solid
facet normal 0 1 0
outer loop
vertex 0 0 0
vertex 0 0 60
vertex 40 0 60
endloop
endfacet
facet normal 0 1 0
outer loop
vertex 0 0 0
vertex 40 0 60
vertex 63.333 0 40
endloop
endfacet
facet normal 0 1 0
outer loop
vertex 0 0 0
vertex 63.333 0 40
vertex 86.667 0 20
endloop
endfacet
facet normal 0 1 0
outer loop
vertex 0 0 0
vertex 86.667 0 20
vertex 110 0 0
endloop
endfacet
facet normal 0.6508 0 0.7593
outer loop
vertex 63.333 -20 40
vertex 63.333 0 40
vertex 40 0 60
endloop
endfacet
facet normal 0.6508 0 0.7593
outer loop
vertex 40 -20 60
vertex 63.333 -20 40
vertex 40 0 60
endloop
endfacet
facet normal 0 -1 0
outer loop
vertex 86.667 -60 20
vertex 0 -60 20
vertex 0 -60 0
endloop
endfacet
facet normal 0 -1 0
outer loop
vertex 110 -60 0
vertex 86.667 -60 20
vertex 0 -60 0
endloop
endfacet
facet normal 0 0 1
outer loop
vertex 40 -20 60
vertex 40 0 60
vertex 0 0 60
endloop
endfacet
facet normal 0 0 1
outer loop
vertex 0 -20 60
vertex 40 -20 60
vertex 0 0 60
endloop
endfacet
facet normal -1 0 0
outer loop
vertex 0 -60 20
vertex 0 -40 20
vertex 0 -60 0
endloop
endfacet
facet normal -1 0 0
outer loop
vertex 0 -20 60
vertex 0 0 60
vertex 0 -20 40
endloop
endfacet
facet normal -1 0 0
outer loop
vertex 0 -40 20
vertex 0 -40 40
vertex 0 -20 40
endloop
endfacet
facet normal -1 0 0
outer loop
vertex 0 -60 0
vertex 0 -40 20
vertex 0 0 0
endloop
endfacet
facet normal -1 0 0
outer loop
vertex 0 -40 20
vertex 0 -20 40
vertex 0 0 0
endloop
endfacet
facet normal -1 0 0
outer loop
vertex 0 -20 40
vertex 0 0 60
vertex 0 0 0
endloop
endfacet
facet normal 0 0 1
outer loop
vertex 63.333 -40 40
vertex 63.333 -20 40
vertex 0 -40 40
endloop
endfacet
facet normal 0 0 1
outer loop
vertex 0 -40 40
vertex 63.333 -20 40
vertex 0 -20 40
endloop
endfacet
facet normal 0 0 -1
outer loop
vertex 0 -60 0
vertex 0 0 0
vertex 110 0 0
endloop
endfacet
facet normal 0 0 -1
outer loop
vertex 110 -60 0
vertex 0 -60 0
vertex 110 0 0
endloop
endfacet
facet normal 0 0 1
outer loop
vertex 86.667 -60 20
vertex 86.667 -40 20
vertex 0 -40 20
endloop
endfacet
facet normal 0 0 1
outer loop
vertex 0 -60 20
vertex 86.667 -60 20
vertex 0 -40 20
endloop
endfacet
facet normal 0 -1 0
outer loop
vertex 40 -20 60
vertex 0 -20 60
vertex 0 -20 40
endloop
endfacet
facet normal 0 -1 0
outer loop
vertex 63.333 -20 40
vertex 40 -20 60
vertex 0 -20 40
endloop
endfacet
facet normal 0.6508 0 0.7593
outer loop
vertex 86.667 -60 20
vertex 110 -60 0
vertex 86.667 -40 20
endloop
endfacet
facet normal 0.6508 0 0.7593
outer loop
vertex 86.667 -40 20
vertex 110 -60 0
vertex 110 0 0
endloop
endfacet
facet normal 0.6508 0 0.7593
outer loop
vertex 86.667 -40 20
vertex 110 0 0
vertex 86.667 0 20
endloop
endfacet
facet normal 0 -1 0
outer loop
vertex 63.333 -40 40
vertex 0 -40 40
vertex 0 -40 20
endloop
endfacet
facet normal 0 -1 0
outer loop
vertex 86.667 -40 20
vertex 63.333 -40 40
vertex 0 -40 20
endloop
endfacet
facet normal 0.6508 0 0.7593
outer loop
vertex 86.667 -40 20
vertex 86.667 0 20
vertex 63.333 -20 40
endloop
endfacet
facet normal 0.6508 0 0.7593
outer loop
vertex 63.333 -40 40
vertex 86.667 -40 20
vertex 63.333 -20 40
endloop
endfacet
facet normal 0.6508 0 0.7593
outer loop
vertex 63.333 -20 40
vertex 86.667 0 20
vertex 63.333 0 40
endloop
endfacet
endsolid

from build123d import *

# Parameters (mm, degrees)
F1_DEPTH = 20
F2_DEPTH = 40
F3_DEPTH = 60


with BuildPart() as f1:
    # F0 (on Front) → F1 (new body)
    with BuildSketch(Plane.XZ):
        Polygon((0, 60), (0, 40), (63.333333, 40), (40, 60), align=None)
    extrude(amount=F1_DEPTH)

    # F0 (on Front) → F2 (join)
    with BuildSketch(Plane.XZ):
        Polygon((0, 40), (0, 20), (86.666667, 20), (63.333333, 40), align=None)
    extrude(amount=F2_DEPTH)

    # F0 (on Front) → F3 (join)
    with BuildSketch(Plane.XZ):
        Polygon((0, 20), (0, 0), (110, 0), (86.666667, 20), align=None)
    extrude(amount=F3_DEPTH)


solid = f1.part
